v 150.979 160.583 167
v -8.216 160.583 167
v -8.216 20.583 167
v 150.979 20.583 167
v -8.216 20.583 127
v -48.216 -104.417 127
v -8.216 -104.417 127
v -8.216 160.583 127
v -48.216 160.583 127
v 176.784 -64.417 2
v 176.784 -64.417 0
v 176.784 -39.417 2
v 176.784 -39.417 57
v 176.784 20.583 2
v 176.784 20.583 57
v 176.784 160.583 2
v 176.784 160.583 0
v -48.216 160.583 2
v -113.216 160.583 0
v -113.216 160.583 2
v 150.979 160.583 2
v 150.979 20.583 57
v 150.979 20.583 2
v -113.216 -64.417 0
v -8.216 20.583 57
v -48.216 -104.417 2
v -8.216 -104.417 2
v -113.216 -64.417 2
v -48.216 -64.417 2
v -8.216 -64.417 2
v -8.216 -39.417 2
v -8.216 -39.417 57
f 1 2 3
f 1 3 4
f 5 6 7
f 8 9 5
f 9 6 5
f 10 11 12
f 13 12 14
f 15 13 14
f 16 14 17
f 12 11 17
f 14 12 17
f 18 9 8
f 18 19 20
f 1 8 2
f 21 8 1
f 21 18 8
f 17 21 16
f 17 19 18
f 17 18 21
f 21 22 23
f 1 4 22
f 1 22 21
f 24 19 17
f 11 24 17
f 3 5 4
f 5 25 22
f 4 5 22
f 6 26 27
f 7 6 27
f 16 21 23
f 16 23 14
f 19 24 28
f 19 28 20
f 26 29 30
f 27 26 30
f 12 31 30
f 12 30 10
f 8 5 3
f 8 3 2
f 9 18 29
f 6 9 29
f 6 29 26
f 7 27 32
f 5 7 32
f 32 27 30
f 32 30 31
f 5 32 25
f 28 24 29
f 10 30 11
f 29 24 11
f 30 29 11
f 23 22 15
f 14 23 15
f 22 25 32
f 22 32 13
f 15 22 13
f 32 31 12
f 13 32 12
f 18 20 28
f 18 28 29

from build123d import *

# Parameters (mm, degrees)
F0_W     = 290
F0_H     = 225
F1_DEPTH = 2
F2_W     = 40
F2_H     = 225
F2_H_2   = 40
F3_DEPTH = 125
F4_W     = 185
F4_H     = 140
F5_DEPTH = 165
F6_W     = 185
F6_H     = 60
F7_DEPTH = 55
F8_W     = 25.804932
F8_H     = 140
F9_DEPTH = 165


with BuildPart() as f1:
    # F0 (on Top) → F1 (new body)
    with BuildSketch(Plane.XY):
        with Locations((31.78409, 48.083462)):
            Rectangle(F0_W, F0_H)
    extrude(amount=F1_DEPTH)

    # F2 (on face) → F3 (join)
    with BuildSketch(Plane.XY.offset(2)):
        with Locations((-28.21591, 48.083462)):
            Rectangle(F2_W, F2_H)
        with Locations((-28.21591, -84.416538)):
            Rectangle(F2_W, F2_H_2)
    extrude(amount=F3_DEPTH)

    # F4 (on face) → F5 (join)
    with BuildSketch(Plane.XY.offset(2)):
        with Locations((84.28409, 90.583462)):
            Rectangle(F4_W, F4_H)
    extrude(amount=F5_DEPTH)

    # F6 (on face) → F7 (join)
    with BuildSketch(Plane.XY.offset(2)):
        with Locations((84.28409, -9.416538)):
            Rectangle(F6_W, F6_H)
    extrude(amount=F7_DEPTH)

    # F8 (on face) → F9 (cut)
    with BuildSketch(Plane.XY.offset(167)):
        with Locations((163.881624, 90.583462)):
            Rectangle(F8_W, F8_H)
    extrude(amount=-F9_DEPTH, mode=Mode.SUBTRACT)


solid = f1.part
